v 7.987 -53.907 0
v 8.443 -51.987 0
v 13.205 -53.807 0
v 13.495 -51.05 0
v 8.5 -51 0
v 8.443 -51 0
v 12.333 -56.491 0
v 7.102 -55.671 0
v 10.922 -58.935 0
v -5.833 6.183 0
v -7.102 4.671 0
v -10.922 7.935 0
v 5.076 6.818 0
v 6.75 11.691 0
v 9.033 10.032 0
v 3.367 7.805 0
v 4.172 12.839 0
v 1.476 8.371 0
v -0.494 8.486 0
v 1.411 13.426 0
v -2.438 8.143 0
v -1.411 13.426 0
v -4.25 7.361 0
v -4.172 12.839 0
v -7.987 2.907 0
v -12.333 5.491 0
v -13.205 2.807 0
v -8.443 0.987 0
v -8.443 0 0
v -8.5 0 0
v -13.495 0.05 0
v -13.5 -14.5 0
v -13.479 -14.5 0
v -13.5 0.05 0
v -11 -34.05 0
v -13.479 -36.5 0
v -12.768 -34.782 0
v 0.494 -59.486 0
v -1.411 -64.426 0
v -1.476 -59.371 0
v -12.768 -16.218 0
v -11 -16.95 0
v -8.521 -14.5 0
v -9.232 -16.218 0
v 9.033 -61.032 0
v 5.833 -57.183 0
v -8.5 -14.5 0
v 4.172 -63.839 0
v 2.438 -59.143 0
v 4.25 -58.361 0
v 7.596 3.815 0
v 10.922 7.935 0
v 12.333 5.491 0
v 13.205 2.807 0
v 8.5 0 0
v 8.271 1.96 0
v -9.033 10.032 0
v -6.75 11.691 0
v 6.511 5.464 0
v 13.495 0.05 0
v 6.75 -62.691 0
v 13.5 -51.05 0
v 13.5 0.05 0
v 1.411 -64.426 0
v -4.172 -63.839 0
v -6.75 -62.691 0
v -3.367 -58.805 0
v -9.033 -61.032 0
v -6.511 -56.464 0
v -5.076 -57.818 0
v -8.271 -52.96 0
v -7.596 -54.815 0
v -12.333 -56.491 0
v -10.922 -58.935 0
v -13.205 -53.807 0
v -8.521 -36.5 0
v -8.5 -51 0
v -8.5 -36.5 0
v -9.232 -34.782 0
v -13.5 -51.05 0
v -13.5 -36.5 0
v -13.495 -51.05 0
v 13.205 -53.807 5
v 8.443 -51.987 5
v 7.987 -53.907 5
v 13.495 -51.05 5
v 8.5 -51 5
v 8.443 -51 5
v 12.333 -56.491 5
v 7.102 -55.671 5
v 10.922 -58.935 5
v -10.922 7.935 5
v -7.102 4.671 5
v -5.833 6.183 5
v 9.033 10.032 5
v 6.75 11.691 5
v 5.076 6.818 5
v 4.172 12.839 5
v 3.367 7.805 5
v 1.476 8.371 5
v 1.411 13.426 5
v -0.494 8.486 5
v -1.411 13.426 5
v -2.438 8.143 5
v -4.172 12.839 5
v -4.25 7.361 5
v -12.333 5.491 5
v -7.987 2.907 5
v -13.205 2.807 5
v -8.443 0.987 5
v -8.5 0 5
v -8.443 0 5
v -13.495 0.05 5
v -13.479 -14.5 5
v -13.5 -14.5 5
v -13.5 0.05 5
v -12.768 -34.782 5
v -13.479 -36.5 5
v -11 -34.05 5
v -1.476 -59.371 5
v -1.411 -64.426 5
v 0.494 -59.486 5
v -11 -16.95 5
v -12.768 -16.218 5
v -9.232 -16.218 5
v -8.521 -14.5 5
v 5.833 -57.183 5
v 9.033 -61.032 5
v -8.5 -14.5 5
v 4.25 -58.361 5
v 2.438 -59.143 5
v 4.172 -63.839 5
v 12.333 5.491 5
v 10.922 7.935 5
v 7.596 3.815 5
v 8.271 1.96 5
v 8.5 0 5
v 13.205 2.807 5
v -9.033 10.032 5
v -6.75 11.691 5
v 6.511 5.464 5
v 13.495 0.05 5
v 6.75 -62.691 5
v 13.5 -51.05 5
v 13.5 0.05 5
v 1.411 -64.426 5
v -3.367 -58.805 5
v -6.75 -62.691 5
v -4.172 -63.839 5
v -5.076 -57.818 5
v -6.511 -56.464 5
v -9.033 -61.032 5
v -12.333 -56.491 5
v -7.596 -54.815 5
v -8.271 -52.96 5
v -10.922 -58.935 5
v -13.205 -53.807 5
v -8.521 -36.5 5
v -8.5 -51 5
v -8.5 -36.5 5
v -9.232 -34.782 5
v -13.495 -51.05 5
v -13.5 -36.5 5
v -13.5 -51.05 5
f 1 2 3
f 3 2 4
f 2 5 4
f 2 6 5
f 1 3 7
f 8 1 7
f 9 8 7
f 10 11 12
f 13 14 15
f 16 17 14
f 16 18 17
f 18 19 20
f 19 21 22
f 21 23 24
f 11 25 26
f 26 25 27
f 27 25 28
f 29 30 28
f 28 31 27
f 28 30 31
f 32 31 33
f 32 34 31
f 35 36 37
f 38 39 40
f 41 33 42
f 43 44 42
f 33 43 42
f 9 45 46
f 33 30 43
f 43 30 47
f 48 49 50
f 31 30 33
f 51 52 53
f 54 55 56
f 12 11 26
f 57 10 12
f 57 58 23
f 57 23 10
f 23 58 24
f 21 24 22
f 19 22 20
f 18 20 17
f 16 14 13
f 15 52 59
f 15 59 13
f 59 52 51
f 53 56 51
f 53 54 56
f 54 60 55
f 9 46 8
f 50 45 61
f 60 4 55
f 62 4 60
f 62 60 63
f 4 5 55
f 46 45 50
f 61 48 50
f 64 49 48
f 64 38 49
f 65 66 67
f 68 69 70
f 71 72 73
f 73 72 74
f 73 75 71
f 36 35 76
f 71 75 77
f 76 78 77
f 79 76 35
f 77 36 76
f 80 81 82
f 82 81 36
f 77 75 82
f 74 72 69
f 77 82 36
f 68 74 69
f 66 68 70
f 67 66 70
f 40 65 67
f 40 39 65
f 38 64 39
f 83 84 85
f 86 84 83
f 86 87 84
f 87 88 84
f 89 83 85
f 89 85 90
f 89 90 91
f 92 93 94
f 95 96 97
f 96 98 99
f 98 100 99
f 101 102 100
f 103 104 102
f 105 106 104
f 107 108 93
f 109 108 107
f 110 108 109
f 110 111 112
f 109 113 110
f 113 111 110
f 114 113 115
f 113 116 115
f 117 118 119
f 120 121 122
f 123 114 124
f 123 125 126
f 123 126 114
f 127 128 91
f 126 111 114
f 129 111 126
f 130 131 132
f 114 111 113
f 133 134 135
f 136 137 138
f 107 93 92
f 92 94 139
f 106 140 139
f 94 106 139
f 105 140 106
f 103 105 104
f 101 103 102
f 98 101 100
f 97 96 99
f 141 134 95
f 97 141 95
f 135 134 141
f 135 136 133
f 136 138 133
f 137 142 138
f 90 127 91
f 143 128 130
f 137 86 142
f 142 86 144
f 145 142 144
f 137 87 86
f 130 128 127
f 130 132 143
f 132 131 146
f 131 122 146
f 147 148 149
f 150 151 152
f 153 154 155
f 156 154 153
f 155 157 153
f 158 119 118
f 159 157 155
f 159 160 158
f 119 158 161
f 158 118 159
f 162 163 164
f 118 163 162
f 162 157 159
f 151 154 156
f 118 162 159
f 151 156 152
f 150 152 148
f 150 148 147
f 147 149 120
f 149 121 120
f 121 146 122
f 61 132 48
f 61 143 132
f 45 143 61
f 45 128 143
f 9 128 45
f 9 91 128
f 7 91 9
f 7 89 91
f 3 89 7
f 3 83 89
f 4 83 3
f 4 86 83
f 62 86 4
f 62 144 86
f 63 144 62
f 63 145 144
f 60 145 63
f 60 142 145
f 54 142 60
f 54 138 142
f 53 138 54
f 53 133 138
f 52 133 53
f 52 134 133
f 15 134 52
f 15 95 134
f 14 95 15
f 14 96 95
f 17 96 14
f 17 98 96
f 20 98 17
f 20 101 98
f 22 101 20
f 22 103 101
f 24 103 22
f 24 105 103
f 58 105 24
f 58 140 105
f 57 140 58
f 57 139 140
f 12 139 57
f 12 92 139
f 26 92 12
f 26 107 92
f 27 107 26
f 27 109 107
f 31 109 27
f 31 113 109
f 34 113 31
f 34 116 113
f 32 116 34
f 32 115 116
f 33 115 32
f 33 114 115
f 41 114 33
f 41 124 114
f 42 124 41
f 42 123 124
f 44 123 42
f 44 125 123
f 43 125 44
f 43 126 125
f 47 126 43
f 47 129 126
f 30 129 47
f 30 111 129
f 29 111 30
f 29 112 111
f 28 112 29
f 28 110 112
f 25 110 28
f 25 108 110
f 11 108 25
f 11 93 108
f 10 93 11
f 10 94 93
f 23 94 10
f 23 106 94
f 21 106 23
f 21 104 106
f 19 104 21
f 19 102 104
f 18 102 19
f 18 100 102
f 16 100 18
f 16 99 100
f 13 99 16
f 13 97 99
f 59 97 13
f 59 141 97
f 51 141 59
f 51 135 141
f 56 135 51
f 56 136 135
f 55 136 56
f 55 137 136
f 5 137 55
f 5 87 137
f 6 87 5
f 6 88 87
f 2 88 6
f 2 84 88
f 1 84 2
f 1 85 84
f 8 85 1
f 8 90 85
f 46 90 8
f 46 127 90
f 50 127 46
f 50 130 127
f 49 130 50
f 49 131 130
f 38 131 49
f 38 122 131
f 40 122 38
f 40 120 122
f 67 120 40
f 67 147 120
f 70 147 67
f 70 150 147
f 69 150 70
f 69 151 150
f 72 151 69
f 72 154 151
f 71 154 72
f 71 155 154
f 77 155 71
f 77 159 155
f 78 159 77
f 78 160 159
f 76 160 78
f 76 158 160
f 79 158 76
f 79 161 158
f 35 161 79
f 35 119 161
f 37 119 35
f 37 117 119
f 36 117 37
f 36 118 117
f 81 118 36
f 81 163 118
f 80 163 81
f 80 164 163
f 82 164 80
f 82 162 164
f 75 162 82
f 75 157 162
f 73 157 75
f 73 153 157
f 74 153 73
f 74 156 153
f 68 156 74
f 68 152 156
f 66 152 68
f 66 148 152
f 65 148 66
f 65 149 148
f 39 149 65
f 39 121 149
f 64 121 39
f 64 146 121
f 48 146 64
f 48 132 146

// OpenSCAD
e=0.1;

thickness = 5;

gap = 17;

radius = gap/2+thickness;

adtlSpace = 2*gap;

module arch(){
	difference(){
		circle( radius );
		circle( radius-thickness );
		translate([-radius,-radius])
		square([2*radius,radius]);
	}
}

linear_extrude(thickness){
	arch();

	translate([0,-gap-adtlSpace])
	rotate([0,0,180])
	arch();

	translate([radius-thickness,-gap-adtlSpace-e/2])
	square([thickness,gap+adtlSpace+e]);
	difference(){
		translate([-radius,-gap-adtlSpace-e/2])
		square([thickness,gap+adtlSpace+e]);

		translate([-radius,-gap-adtlSpace/2-thickness/2])
		square([thickness,gap+thickness]);
	}
	
	translate([-radius+thickness/2,-adtlSpace/2+thickness/2+e/2])
	circle(thickness/2);
	translate([-radius+thickness/2,-gap-adtlSpace/2-thickness/2-e/2])
	circle(thickness/2);
}
